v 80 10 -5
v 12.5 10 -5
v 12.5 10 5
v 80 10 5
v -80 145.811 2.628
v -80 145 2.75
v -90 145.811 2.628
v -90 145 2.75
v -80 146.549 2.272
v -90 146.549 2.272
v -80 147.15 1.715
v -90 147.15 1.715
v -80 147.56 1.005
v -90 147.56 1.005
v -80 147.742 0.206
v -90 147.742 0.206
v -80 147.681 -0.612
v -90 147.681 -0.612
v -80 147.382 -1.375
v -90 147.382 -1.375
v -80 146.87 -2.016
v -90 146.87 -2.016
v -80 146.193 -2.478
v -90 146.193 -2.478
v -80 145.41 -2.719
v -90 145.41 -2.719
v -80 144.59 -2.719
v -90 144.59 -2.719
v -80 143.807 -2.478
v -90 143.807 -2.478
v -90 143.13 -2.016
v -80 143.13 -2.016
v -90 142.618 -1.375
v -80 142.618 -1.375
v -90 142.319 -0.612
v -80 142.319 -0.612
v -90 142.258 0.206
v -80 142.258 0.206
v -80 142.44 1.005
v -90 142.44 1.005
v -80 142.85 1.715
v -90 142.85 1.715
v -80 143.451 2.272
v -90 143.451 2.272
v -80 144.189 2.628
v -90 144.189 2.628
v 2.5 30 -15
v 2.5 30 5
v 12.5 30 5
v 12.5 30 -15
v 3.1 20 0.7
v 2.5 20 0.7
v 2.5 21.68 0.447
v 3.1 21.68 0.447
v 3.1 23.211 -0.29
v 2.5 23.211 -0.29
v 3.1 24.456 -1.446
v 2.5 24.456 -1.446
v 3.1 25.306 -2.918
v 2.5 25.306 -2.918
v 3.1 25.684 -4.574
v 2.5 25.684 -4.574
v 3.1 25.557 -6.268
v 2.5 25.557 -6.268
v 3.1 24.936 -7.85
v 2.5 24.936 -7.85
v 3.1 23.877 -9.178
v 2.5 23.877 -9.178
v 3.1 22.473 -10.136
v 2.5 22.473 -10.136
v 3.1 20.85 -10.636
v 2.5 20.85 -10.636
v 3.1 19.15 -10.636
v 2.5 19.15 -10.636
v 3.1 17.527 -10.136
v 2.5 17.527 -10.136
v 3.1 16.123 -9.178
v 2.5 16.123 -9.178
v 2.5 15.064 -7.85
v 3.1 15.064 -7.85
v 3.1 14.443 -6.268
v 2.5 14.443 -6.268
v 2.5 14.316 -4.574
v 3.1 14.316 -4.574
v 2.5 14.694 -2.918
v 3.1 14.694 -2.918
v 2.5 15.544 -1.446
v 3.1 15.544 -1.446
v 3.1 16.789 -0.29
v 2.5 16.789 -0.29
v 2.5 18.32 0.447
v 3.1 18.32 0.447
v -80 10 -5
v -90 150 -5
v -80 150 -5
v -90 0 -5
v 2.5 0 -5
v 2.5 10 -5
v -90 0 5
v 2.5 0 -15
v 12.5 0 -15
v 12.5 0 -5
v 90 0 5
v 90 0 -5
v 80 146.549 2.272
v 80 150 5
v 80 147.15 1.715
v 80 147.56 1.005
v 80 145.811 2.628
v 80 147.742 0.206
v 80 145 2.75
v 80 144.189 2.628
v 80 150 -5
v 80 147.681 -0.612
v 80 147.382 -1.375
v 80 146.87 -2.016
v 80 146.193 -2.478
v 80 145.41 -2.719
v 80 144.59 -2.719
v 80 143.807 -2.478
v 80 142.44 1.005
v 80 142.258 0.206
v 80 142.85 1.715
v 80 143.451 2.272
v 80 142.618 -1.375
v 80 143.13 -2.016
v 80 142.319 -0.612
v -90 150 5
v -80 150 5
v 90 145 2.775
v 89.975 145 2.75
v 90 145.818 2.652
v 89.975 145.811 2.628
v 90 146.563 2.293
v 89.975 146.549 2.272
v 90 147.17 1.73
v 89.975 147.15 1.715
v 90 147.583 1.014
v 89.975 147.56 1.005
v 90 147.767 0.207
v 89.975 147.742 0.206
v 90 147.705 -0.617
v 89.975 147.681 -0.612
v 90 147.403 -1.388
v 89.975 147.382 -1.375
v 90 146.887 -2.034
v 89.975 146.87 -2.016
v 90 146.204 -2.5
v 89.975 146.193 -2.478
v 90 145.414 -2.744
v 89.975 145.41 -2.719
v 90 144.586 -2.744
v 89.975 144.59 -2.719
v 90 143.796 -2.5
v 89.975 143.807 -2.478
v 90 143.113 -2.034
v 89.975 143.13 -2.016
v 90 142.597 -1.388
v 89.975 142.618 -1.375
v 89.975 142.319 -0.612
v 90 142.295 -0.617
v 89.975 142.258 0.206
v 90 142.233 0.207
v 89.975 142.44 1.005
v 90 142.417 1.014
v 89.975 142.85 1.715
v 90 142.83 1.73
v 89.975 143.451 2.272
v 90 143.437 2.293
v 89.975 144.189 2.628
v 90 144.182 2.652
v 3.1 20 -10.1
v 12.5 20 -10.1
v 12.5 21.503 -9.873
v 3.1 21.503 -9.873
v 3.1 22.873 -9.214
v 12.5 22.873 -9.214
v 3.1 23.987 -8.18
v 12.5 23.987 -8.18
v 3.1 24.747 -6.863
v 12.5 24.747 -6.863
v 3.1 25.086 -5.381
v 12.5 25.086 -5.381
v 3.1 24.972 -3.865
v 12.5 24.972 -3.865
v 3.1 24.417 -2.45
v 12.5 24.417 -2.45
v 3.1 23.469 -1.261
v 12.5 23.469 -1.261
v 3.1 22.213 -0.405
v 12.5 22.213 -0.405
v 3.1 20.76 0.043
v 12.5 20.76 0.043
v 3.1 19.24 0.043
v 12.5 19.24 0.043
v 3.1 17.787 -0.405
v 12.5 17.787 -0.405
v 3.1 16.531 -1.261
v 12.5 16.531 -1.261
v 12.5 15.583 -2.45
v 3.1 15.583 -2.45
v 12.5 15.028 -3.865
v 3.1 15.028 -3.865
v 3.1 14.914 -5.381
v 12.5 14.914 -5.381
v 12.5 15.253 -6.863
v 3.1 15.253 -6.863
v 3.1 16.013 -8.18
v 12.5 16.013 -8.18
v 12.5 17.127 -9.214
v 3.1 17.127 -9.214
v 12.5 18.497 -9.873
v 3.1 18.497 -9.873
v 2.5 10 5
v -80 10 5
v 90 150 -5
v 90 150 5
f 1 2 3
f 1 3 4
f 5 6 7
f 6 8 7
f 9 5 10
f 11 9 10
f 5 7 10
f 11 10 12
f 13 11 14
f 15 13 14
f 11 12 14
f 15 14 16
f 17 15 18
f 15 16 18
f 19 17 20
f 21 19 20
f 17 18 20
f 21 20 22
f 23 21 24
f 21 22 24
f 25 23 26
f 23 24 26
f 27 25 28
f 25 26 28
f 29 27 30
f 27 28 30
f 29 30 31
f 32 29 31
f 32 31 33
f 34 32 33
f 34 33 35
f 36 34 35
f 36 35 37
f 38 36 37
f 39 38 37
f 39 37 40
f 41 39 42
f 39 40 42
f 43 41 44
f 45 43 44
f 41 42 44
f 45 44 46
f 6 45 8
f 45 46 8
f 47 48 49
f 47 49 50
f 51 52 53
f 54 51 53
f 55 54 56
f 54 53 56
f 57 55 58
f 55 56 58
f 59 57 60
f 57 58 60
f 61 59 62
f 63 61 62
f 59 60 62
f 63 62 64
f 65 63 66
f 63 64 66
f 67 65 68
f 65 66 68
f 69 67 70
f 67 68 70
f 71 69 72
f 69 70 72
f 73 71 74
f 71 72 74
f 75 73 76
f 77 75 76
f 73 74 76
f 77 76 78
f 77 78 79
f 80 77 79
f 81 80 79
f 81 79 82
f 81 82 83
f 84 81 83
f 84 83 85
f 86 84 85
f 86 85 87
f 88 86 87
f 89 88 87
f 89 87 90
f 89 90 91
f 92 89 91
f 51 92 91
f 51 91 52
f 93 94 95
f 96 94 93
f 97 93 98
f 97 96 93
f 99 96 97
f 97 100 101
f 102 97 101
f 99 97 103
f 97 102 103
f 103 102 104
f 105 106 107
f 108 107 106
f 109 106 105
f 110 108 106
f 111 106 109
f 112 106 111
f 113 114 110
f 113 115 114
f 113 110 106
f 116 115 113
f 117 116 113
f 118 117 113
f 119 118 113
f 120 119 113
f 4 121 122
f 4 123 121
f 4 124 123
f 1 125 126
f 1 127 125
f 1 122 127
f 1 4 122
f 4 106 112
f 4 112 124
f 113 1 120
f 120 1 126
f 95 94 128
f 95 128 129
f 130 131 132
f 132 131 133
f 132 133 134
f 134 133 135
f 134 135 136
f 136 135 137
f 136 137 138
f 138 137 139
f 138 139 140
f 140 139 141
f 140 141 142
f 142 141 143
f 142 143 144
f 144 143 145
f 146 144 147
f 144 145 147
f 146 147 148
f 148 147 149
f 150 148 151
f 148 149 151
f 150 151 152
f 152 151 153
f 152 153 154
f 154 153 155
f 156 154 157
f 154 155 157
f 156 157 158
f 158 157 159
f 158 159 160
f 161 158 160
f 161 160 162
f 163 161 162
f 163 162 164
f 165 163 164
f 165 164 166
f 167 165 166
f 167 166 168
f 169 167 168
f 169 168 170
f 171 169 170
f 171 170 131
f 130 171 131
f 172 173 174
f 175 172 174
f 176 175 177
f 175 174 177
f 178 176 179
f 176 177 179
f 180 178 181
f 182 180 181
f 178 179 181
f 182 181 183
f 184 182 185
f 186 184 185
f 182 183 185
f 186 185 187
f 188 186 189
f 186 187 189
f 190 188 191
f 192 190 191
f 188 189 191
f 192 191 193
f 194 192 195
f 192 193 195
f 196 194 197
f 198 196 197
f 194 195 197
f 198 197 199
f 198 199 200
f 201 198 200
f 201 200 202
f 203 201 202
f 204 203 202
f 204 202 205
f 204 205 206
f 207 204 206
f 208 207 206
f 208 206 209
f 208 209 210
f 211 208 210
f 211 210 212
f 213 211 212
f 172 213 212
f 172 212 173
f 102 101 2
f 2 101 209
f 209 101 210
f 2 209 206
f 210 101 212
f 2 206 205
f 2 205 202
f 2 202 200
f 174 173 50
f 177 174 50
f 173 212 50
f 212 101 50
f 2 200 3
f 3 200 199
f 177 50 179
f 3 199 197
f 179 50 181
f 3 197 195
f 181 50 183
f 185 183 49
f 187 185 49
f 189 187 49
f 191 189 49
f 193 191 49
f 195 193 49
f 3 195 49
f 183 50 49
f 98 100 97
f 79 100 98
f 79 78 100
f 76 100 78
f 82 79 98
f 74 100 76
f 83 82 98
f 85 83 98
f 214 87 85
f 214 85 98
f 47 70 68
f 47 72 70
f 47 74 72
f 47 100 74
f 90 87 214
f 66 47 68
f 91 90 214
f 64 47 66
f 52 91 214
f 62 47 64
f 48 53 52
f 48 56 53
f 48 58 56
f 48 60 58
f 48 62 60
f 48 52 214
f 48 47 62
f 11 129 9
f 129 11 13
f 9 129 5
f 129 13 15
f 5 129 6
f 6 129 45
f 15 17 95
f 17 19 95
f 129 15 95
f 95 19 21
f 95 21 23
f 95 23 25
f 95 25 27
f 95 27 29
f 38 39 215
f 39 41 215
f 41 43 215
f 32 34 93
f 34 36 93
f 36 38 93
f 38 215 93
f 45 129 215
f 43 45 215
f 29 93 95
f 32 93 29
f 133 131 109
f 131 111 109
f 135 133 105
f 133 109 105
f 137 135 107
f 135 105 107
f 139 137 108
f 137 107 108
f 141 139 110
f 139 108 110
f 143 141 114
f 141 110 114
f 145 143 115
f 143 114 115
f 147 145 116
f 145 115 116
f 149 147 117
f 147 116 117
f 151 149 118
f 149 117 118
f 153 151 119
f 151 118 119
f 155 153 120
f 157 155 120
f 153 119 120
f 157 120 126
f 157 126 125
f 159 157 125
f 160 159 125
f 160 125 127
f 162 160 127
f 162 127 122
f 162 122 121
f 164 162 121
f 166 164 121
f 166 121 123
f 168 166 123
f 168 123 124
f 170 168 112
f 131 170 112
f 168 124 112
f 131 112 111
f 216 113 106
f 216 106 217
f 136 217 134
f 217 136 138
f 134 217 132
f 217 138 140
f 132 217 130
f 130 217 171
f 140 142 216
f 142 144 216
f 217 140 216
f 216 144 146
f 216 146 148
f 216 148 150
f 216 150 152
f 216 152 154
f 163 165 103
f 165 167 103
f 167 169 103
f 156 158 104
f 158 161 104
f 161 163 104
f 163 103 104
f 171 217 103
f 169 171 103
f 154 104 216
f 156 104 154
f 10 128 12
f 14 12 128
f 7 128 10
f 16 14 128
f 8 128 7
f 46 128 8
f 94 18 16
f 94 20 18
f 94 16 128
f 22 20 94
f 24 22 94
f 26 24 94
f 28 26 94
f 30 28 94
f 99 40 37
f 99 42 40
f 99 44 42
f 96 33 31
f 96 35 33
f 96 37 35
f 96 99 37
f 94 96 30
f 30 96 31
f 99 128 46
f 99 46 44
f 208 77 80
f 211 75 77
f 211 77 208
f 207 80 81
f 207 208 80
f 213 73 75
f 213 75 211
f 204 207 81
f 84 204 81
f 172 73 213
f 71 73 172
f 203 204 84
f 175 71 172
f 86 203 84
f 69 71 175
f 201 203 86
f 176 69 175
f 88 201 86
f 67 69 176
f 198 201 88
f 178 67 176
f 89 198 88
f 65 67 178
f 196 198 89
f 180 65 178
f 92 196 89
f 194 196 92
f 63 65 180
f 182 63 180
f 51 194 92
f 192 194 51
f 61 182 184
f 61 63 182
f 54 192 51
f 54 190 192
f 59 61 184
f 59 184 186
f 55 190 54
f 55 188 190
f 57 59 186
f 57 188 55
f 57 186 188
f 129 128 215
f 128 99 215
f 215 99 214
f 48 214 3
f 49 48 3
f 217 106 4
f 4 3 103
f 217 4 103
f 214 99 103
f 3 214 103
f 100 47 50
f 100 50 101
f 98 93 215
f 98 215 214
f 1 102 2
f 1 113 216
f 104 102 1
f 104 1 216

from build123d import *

# Parameters (mm, degrees)
SKETCH1_W                      = 180
SKETCH1_H                      = 10
BOSS_EXTRUDE1_DEPTH            = 10
SKETCH2_W                      = 10
SKETCH2_H                      = 10
BOSS_EXTRUDE2_DEPTH            = 140
M5_CLEARANCE_HOLE1_D           = 5.5
M5_CLEARANCE_HOLE1_CSINK_D     = 5.55
M5_CLEARANCE_HOLE1_CSINK_ANGLE = 90
BOSS_EXTRUDE3_START            = 2.5
BOSS_EXTRUDE3_DEPTH            = 10
HOLE1_D                        = 10.2
HOLE1_DEPTH                    = 10
HOLE1_CBORE_D                  = 11.4
HOLE1_CBORE_DEPTH              = 0.6


with BuildPart() as part:
    # Sketch1 → Boss-Extrude1 (new body)
    with BuildSketch(Plane(origin=(0, 0, 0), x_dir=(1, 0, 0), z_dir=(0, 1, 0))):
        Rectangle(SKETCH1_W, SKETCH1_H)
    extrude(amount=BOSS_EXTRUDE1_DEPTH)

    # Sketch2 → Boss-Extrude2 (add)
    with BuildSketch(Plane(origin=(0, 10, 0), x_dir=(1, 0, 0), z_dir=(0, 1, 0))):
        with Locations((-85, 0)):
            Rectangle(SKETCH2_W, SKETCH2_H)
        with Locations((85, 0)):
            Rectangle(SKETCH2_W, SKETCH2_H)
    extrude(amount=BOSS_EXTRUDE2_DEPTH)

    # M5 Clearance Hole1 (through all)
    with Locations(Plane(origin=(90, 0, 0), x_dir=(0, 0, -1), z_dir=(1, 0, 0))):
        with Locations((0, 145)):
            CounterSinkHole(M5_CLEARANCE_HOLE1_D / 2, M5_CLEARANCE_HOLE1_CSINK_D / 2, counter_sink_angle=M5_CLEARANCE_HOLE1_CSINK_ANGLE)

    # Sketch6 → Boss-Extrude3 (add)
    with BuildSketch(Plane(origin=(0, 0, 0), x_dir=(0, 0, -1), z_dir=(1, 0, 0)).offset(BOSS_EXTRUDE3_START)):
        Polygon((5, 0), (5, 10), (-5, 10), (-5, 30), (15, 30), (15, 0), align=None)
    extrude(amount=BOSS_EXTRUDE3_DEPTH)

    # Hole1
    with Locations(Plane.ZY.offset(-2.5)):
        with Locations((-5, 20)):
            CounterBoreHole(HOLE1_D / 2, HOLE1_CBORE_D / 2, HOLE1_CBORE_DEPTH, depth=HOLE1_DEPTH)


solid = part.part
